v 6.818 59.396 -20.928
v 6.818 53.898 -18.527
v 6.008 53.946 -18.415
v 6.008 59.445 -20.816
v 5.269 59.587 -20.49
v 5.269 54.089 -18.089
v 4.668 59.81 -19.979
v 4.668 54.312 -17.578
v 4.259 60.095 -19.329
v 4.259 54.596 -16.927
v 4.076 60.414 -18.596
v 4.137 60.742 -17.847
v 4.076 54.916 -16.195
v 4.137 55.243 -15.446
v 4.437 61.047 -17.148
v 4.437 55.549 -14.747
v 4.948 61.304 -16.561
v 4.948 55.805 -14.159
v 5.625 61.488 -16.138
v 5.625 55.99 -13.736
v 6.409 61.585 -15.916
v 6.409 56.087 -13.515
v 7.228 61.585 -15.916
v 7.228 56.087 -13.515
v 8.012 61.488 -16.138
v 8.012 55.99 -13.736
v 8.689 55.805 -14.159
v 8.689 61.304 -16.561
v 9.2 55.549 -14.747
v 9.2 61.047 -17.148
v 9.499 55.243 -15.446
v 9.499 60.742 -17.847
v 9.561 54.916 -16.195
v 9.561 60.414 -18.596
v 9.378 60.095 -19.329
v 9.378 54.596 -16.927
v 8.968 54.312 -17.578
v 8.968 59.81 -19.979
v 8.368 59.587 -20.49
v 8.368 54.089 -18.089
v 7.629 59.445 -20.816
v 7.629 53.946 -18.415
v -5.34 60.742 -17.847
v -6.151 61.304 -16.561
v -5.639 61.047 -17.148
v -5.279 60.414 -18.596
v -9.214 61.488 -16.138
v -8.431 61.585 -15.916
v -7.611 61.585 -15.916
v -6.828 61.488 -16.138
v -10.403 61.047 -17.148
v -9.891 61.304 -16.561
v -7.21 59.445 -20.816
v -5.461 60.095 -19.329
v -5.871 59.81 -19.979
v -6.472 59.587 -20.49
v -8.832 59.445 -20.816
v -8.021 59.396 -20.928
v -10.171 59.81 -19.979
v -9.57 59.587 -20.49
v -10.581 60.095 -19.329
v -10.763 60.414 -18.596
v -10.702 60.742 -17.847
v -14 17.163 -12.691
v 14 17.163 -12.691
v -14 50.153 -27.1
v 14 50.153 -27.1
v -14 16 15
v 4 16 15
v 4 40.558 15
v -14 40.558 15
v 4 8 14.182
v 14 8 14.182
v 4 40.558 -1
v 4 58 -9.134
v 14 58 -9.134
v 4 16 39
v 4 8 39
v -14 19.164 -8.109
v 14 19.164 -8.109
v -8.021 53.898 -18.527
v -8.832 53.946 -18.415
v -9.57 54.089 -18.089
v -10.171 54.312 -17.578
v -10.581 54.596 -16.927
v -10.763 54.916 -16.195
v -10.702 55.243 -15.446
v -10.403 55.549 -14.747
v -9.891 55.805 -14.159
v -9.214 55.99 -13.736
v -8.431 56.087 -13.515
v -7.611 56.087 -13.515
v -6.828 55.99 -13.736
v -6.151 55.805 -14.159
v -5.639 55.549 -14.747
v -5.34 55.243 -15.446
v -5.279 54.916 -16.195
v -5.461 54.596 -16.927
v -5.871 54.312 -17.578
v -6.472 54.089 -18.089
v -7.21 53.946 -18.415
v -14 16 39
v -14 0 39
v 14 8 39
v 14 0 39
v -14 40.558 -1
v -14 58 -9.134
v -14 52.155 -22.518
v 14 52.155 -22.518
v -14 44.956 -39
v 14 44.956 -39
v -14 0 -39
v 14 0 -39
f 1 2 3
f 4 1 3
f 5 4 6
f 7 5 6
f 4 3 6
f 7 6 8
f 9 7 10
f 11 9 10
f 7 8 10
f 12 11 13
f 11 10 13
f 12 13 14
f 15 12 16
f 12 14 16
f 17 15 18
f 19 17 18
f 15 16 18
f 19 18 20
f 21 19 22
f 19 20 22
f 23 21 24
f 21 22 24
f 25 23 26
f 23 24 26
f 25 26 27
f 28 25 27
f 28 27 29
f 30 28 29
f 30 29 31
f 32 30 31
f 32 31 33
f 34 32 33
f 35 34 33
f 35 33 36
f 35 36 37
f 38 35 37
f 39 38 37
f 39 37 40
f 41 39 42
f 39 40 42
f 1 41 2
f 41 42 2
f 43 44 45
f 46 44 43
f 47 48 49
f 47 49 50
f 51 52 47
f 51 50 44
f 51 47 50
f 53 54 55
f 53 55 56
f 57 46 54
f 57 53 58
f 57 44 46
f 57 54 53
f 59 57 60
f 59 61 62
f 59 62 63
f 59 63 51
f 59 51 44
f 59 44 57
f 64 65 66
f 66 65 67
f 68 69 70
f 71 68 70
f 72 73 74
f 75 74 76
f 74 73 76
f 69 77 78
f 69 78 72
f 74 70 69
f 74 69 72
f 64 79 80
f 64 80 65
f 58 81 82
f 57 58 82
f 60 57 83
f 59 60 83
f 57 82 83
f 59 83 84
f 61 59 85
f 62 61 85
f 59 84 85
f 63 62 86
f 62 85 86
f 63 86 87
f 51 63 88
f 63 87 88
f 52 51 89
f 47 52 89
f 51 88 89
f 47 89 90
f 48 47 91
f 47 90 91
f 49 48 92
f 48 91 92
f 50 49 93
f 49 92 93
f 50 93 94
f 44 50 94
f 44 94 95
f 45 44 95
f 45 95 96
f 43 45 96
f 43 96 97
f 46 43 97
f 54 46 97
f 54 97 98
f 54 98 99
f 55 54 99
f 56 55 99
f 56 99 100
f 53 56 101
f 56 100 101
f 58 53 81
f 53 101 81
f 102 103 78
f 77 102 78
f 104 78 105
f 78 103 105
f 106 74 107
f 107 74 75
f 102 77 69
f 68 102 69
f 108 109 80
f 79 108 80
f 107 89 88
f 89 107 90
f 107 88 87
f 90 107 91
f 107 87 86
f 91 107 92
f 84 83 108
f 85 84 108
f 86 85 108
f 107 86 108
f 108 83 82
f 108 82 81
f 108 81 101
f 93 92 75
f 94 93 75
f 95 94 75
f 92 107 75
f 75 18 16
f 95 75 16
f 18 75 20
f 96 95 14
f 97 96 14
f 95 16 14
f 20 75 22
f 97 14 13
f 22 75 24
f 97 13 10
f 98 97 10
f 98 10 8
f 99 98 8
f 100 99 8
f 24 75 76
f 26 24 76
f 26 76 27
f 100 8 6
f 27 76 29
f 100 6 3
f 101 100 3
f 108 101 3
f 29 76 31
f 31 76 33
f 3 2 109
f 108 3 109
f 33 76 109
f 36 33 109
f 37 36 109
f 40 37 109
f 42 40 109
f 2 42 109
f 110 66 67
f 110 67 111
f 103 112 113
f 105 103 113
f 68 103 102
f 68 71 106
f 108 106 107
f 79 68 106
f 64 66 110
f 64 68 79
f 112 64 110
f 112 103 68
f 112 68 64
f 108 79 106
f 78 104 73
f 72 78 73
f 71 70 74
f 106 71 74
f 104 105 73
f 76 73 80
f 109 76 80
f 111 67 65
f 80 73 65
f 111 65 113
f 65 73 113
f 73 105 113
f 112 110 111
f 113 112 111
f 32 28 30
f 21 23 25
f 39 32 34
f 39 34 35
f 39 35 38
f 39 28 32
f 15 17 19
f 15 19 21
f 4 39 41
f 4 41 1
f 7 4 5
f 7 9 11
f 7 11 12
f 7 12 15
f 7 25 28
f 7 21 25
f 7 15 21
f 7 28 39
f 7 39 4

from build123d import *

# Parameters (mm, degrees)
SKETCH1_W           = 28
SKETCH1_H           = 78
BOSS_EXTRUDE1_DEPTH = 58
CUT_EXTRUDE1_DEPTH  = 10
CUT_EXTRUDE2_DEPTH  = 20
CUT_EXTRUDE3_DEPTH  = 30
SKETCH5_R           = 2.75
BOSS_EXTRUDE2_DEPTH = 6


with BuildPart() as part:
    # Sketch1 → Boss-Extrude1 (new body)
    with BuildSketch(Plane(origin=(0, 0, 0), x_dir=(1, 0, 0), z_dir=(0, 1, 0))):
        Rectangle(SKETCH1_W, SKETCH1_H)
    extrude(amount=BOSS_EXTRUDE1_DEPTH)

    # Sketch2 → Cut-Extrude1 (cut)
    with BuildSketch(Plane(origin=(14, 0, 0), x_dir=(0, 0, -1), z_dir=(1, 0, 0))):
        Polygon((-39, 8), (-14.181832949, 8), (9.133549959, 58), (-39, 58), align=None)
    extrude(amount=-CUT_EXTRUDE1_DEPTH, mode=Mode.SUBTRACT)

    # Sketch3 → Cut-Extrude2 (cut)
    with BuildSketch(Plane(origin=(4, 0, 0), x_dir=(0, 0, -1), z_dir=(1, 0, 0))):
        Polygon((-39, 16), (-15, 16), (-15, 40.557545824), (1, 40.557545824), (9.133549959, 58), (-39, 58), align=None)
    extrude(amount=-CUT_EXTRUDE2_DEPTH, mode=Mode.SUBTRACT)

    # Sketch4 → Cut-Extrude3 (cut)
    with BuildSketch(Plane(origin=(14, 0, 0), x_dir=(0, 0, -1), z_dir=(1, 0, 0))):
        Polygon((9.133549959, 58), (22.517676281, 52.154545261), (8.109098298, 19.163745323), (12.691153845, 17.162553937), (27.099731828, 50.153353874), (39, 44.95596726), (39, 58), align=None)
    extrude(amount=-CUT_EXTRUDE3_DEPTH, mode=Mode.SUBTRACT)

    # Sketch5 → Boss-Extrude2 (add)
    with BuildSketch(Plane(origin=(0, 52.058969702, -22.736512182), x_dir=(1, 0, 0), z_dir=(0, 0.9164111093707628, -0.40023827730721606))):
        with Locations(Location((-8.021015767, -7.343733433, 0), (0, 0, 90))):
            Circle(SKETCH5_R)
        with Locations(Location((6.818441056, -7.343733433, 0), (0, 0, 90))):
            Circle(SKETCH5_R)
    extrude(amount=BOSS_EXTRUDE2_DEPTH)


solid = part.part
